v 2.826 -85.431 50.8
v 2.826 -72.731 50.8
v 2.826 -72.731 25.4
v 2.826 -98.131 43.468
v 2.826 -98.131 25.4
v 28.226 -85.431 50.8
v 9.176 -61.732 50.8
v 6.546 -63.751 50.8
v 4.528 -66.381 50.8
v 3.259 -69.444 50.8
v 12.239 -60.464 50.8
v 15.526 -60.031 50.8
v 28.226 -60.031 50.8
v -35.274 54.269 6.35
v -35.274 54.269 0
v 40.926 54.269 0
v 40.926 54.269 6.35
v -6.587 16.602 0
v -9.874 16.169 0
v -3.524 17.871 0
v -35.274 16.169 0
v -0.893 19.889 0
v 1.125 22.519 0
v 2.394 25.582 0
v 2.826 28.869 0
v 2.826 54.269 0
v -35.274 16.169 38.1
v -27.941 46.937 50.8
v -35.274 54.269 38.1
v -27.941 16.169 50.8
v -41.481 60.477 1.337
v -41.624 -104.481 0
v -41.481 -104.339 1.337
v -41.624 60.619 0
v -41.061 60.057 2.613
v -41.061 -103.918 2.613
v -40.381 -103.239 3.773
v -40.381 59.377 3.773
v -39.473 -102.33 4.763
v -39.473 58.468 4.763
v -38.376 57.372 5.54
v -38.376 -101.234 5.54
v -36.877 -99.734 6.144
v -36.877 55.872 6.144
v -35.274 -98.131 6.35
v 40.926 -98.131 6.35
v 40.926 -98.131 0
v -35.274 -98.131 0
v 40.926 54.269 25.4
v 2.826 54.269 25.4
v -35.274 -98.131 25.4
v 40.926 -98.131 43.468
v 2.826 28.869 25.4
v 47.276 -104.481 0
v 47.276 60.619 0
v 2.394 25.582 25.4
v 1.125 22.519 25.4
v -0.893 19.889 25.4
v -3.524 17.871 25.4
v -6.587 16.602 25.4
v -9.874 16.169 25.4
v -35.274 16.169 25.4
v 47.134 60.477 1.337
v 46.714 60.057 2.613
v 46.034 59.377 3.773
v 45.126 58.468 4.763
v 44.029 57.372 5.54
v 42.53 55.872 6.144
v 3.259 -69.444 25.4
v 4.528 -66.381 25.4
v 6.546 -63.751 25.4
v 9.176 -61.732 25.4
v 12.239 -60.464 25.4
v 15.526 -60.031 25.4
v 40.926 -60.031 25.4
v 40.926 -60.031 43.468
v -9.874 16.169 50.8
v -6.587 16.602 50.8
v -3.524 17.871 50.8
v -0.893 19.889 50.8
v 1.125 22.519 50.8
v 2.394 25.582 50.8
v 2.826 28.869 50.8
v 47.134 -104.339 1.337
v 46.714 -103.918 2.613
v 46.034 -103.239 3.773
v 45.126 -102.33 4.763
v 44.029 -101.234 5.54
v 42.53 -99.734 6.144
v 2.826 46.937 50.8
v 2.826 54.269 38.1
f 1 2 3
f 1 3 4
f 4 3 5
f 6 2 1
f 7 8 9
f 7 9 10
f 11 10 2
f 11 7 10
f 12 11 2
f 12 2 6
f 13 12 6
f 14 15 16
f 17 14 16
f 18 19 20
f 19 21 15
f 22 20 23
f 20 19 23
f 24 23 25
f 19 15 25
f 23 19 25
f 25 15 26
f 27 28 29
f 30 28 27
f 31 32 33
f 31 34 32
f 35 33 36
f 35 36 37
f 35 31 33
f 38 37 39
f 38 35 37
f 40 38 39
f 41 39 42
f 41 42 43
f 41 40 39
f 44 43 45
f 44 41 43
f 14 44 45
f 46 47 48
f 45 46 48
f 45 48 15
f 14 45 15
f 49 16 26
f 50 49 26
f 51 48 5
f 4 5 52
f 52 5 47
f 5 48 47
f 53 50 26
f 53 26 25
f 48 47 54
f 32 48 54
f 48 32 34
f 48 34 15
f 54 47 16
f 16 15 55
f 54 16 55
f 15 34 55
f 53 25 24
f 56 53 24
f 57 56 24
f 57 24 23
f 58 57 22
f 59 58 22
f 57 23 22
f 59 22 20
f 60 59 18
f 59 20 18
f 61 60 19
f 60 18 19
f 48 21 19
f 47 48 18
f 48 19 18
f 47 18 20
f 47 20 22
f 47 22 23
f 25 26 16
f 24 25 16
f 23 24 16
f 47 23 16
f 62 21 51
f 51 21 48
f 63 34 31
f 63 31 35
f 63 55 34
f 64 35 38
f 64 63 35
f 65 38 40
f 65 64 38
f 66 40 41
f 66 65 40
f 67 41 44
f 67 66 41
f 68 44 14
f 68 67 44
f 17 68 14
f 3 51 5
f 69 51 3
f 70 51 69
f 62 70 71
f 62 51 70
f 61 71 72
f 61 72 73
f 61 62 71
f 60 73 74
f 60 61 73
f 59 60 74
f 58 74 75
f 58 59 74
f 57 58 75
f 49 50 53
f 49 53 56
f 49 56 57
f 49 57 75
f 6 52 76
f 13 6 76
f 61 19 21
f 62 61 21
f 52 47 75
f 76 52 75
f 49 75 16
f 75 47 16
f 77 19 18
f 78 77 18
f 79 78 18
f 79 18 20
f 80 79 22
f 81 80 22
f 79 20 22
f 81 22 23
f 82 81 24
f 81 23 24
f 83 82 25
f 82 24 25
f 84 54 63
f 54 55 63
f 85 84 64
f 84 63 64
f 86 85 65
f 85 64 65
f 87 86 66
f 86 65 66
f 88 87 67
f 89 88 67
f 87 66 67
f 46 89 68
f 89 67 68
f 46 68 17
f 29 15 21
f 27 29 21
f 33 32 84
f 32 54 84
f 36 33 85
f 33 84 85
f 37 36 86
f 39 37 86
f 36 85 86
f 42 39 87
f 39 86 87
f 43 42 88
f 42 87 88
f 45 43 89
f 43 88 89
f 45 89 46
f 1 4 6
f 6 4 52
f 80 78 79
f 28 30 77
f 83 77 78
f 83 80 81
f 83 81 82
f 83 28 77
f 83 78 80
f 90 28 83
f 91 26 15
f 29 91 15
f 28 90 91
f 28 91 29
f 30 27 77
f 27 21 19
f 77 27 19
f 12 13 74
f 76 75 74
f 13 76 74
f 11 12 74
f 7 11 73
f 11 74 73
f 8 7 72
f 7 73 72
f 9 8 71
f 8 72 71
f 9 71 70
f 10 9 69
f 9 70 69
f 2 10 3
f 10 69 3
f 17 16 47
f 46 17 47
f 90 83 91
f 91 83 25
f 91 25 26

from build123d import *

# Parameters (mm, degrees)
F1_DEPTH = 50.8
F2_DEPTH = 25.4
F0_W     = 88.9
F0_H     = 165.1
F3_DEPTH = 6.35
F4_SIZE2 = 7.3323484187
F4_SIZE  = 12.7
F5_SIZE2 = 7.3323484187
F5_SIZE  = 12.7
F6_R     = 6.34999


# Not quite as in the source:
# - a fillet or chamfer is up to 0.001 mm smaller than in the source, because OpenCascade refuses the exact size


with BuildPart() as f1:
    # F0 (on Top) → F1 (new body)
    with BuildSketch(Plane.XY):
        with BuildLine():
            Line((2.826303332, 54.2691361523), (-35.273696668, 54.2691361523))
            Line((-35.273696668, 54.2691361523), (-35.273696668, 16.1691361523))
            Line((-35.273696668, 16.1691361523), (-9.873696668, 16.1691361523))
            ThreePointArc((-9.873696668, 16.1691361523), (-18.853952789, 37.8493922734), (2.826303332, 28.8691361523))
            Line((2.826303332, 28.8691361523), (2.826303332, 54.2691361523))
        make_face()
        with BuildLine():
            ThreePointArc((-9.873696668, 16.1691361523), (-0.8934405469, 19.8888800313), (2.826303332, 28.8691361523))
            ThreePointArc((2.826303332, 28.8691361523), (-18.853952789, 37.8493922734), (-9.873696668, 16.1691361523))
        make_face()
    extrude(amount=F1_DEPTH)

    # F5
    f5_edges = [f1.edges().sort_by_distance(p)[0] for p in [
        (-16.223697, 54.269136, 50.8),
        (-35.273697, 35.219136, 50.8),
    ]]
    chamfer(f5_edges, length=F5_SIZE, length2=F5_SIZE2)


with BuildPart() as f1b:
    # F0 (on Top) → F1, piece 2 (new body)
    with BuildSketch(Plane.XY):
        with BuildLine():
            ThreePointArc((28.226303332, -72.7308638477), (24.5065594531, -63.7506077266), (15.526303332, -60.0308638477))
            ThreePointArc((15.526303332, -60.0308638477), (6.546047211, -63.7506077266), (2.826303332, -72.7308638477))
            ThreePointArc((2.826303332, -72.7308638477), (15.526303332, -85.4308638477), (28.226303332, -72.7308638477))
        make_face()
        with BuildLine():
            Line((40.926303332, -98.1308638477), (40.926303332, -60.0308638477))
            Line((40.926303332, -60.0308638477), (15.526303332, -60.0308638477))
            ThreePointArc((15.526303332, -60.0308638477), (24.5065594531, -63.7506077266), (28.226303332, -72.7308638477))
            ThreePointArc((28.226303332, -72.7308638477), (15.526303332, -85.4308638477), (2.826303332, -72.7308638477))
            Line((2.826303332, -72.7308638477), (2.826303332, -98.1308638477))
            Line((2.826303332, -98.1308638477), (40.926303332, -98.1308638477))
        make_face()
    extrude(amount=F1_DEPTH)

    # F0 (on Top) → F2 (join)
    with BuildSketch(Plane.XY):
        with BuildLine():
            Line((40.926303332, 54.2691361523), (2.826303332, 54.2691361523))
            Line((2.826303332, 54.2691361523), (2.826303332, 28.8691361523))
            ThreePointArc((2.826303332, 28.8691361523), (-0.8934405469, 19.8888800313), (-9.873696668, 16.1691361523))
            Line((-9.873696668, 16.1691361523), (-35.273696668, 16.1691361523))
            Line((-35.273696668, 16.1691361523), (-35.273696668, -98.1308638477))
            Line((-35.273696668, -98.1308638477), (2.826303332, -98.1308638477))
            Line((2.826303332, -98.1308638477), (2.826303332, -72.7308638477))
            ThreePointArc((2.826303332, -72.7308638477), (6.546047211, -63.7506077266), (15.526303332, -60.0308638477))
            Line((15.526303332, -60.0308638477), (40.926303332, -60.0308638477))
            Line((40.926303332, -60.0308638477), (40.926303332, 54.2691361523))
        make_face()
    extrude(amount=F2_DEPTH)

    # F4
    f4_edges = [f1b.edges().sort_by_distance(p)[0] for p in [
        (21.876303, -98.130864, 50.8),
        (40.926303, -79.080864, 50.8),
    ]]
    f4_side = f1b.faces().sort_by_distance((22.272346, -79.476906, 50.8))[0]
    chamfer(f4_edges, length=F4_SIZE, length2=F4_SIZE2, reference=f4_side)


with BuildPart() as f3:
    # F0 (on Top) → F3 (new body)
    with BuildSketch(Plane.XY):
        with Locations((2.826303332, -21.9308638477)):
            Rectangle(F0_W, F0_H)
        Polygon((-35.273696668, 16.1691361523), (-35.273696668, 54.2691361523), (2.826303332, 54.2691361523), (40.926303332, 54.2691361523), (40.926303332, -60.0308638477), (40.926303332, -98.1308638477), (2.826303332, -98.1308638477), (-35.273696668, -98.1308638477), align=None, mode=Mode.SUBTRACT)
    extrude(amount=F3_DEPTH)

    # F6 (radius 6.35 in the source; OpenCascade refuses exactly that, so slightly less here)
    f6_edges = [f3.edges().sort_by_distance(p)[0] for p in [
        (47.276303, -21.930864, 6.35),
        (2.826303, 60.619136, 6.35),
        (-41.623697, -21.930864, 6.35),
        (2.826303, -104.480864, 6.35),
    ]]
    fillet(f6_edges, radius=F6_R)


solid = Compound([f1.part, f1b.part, f3.part])
